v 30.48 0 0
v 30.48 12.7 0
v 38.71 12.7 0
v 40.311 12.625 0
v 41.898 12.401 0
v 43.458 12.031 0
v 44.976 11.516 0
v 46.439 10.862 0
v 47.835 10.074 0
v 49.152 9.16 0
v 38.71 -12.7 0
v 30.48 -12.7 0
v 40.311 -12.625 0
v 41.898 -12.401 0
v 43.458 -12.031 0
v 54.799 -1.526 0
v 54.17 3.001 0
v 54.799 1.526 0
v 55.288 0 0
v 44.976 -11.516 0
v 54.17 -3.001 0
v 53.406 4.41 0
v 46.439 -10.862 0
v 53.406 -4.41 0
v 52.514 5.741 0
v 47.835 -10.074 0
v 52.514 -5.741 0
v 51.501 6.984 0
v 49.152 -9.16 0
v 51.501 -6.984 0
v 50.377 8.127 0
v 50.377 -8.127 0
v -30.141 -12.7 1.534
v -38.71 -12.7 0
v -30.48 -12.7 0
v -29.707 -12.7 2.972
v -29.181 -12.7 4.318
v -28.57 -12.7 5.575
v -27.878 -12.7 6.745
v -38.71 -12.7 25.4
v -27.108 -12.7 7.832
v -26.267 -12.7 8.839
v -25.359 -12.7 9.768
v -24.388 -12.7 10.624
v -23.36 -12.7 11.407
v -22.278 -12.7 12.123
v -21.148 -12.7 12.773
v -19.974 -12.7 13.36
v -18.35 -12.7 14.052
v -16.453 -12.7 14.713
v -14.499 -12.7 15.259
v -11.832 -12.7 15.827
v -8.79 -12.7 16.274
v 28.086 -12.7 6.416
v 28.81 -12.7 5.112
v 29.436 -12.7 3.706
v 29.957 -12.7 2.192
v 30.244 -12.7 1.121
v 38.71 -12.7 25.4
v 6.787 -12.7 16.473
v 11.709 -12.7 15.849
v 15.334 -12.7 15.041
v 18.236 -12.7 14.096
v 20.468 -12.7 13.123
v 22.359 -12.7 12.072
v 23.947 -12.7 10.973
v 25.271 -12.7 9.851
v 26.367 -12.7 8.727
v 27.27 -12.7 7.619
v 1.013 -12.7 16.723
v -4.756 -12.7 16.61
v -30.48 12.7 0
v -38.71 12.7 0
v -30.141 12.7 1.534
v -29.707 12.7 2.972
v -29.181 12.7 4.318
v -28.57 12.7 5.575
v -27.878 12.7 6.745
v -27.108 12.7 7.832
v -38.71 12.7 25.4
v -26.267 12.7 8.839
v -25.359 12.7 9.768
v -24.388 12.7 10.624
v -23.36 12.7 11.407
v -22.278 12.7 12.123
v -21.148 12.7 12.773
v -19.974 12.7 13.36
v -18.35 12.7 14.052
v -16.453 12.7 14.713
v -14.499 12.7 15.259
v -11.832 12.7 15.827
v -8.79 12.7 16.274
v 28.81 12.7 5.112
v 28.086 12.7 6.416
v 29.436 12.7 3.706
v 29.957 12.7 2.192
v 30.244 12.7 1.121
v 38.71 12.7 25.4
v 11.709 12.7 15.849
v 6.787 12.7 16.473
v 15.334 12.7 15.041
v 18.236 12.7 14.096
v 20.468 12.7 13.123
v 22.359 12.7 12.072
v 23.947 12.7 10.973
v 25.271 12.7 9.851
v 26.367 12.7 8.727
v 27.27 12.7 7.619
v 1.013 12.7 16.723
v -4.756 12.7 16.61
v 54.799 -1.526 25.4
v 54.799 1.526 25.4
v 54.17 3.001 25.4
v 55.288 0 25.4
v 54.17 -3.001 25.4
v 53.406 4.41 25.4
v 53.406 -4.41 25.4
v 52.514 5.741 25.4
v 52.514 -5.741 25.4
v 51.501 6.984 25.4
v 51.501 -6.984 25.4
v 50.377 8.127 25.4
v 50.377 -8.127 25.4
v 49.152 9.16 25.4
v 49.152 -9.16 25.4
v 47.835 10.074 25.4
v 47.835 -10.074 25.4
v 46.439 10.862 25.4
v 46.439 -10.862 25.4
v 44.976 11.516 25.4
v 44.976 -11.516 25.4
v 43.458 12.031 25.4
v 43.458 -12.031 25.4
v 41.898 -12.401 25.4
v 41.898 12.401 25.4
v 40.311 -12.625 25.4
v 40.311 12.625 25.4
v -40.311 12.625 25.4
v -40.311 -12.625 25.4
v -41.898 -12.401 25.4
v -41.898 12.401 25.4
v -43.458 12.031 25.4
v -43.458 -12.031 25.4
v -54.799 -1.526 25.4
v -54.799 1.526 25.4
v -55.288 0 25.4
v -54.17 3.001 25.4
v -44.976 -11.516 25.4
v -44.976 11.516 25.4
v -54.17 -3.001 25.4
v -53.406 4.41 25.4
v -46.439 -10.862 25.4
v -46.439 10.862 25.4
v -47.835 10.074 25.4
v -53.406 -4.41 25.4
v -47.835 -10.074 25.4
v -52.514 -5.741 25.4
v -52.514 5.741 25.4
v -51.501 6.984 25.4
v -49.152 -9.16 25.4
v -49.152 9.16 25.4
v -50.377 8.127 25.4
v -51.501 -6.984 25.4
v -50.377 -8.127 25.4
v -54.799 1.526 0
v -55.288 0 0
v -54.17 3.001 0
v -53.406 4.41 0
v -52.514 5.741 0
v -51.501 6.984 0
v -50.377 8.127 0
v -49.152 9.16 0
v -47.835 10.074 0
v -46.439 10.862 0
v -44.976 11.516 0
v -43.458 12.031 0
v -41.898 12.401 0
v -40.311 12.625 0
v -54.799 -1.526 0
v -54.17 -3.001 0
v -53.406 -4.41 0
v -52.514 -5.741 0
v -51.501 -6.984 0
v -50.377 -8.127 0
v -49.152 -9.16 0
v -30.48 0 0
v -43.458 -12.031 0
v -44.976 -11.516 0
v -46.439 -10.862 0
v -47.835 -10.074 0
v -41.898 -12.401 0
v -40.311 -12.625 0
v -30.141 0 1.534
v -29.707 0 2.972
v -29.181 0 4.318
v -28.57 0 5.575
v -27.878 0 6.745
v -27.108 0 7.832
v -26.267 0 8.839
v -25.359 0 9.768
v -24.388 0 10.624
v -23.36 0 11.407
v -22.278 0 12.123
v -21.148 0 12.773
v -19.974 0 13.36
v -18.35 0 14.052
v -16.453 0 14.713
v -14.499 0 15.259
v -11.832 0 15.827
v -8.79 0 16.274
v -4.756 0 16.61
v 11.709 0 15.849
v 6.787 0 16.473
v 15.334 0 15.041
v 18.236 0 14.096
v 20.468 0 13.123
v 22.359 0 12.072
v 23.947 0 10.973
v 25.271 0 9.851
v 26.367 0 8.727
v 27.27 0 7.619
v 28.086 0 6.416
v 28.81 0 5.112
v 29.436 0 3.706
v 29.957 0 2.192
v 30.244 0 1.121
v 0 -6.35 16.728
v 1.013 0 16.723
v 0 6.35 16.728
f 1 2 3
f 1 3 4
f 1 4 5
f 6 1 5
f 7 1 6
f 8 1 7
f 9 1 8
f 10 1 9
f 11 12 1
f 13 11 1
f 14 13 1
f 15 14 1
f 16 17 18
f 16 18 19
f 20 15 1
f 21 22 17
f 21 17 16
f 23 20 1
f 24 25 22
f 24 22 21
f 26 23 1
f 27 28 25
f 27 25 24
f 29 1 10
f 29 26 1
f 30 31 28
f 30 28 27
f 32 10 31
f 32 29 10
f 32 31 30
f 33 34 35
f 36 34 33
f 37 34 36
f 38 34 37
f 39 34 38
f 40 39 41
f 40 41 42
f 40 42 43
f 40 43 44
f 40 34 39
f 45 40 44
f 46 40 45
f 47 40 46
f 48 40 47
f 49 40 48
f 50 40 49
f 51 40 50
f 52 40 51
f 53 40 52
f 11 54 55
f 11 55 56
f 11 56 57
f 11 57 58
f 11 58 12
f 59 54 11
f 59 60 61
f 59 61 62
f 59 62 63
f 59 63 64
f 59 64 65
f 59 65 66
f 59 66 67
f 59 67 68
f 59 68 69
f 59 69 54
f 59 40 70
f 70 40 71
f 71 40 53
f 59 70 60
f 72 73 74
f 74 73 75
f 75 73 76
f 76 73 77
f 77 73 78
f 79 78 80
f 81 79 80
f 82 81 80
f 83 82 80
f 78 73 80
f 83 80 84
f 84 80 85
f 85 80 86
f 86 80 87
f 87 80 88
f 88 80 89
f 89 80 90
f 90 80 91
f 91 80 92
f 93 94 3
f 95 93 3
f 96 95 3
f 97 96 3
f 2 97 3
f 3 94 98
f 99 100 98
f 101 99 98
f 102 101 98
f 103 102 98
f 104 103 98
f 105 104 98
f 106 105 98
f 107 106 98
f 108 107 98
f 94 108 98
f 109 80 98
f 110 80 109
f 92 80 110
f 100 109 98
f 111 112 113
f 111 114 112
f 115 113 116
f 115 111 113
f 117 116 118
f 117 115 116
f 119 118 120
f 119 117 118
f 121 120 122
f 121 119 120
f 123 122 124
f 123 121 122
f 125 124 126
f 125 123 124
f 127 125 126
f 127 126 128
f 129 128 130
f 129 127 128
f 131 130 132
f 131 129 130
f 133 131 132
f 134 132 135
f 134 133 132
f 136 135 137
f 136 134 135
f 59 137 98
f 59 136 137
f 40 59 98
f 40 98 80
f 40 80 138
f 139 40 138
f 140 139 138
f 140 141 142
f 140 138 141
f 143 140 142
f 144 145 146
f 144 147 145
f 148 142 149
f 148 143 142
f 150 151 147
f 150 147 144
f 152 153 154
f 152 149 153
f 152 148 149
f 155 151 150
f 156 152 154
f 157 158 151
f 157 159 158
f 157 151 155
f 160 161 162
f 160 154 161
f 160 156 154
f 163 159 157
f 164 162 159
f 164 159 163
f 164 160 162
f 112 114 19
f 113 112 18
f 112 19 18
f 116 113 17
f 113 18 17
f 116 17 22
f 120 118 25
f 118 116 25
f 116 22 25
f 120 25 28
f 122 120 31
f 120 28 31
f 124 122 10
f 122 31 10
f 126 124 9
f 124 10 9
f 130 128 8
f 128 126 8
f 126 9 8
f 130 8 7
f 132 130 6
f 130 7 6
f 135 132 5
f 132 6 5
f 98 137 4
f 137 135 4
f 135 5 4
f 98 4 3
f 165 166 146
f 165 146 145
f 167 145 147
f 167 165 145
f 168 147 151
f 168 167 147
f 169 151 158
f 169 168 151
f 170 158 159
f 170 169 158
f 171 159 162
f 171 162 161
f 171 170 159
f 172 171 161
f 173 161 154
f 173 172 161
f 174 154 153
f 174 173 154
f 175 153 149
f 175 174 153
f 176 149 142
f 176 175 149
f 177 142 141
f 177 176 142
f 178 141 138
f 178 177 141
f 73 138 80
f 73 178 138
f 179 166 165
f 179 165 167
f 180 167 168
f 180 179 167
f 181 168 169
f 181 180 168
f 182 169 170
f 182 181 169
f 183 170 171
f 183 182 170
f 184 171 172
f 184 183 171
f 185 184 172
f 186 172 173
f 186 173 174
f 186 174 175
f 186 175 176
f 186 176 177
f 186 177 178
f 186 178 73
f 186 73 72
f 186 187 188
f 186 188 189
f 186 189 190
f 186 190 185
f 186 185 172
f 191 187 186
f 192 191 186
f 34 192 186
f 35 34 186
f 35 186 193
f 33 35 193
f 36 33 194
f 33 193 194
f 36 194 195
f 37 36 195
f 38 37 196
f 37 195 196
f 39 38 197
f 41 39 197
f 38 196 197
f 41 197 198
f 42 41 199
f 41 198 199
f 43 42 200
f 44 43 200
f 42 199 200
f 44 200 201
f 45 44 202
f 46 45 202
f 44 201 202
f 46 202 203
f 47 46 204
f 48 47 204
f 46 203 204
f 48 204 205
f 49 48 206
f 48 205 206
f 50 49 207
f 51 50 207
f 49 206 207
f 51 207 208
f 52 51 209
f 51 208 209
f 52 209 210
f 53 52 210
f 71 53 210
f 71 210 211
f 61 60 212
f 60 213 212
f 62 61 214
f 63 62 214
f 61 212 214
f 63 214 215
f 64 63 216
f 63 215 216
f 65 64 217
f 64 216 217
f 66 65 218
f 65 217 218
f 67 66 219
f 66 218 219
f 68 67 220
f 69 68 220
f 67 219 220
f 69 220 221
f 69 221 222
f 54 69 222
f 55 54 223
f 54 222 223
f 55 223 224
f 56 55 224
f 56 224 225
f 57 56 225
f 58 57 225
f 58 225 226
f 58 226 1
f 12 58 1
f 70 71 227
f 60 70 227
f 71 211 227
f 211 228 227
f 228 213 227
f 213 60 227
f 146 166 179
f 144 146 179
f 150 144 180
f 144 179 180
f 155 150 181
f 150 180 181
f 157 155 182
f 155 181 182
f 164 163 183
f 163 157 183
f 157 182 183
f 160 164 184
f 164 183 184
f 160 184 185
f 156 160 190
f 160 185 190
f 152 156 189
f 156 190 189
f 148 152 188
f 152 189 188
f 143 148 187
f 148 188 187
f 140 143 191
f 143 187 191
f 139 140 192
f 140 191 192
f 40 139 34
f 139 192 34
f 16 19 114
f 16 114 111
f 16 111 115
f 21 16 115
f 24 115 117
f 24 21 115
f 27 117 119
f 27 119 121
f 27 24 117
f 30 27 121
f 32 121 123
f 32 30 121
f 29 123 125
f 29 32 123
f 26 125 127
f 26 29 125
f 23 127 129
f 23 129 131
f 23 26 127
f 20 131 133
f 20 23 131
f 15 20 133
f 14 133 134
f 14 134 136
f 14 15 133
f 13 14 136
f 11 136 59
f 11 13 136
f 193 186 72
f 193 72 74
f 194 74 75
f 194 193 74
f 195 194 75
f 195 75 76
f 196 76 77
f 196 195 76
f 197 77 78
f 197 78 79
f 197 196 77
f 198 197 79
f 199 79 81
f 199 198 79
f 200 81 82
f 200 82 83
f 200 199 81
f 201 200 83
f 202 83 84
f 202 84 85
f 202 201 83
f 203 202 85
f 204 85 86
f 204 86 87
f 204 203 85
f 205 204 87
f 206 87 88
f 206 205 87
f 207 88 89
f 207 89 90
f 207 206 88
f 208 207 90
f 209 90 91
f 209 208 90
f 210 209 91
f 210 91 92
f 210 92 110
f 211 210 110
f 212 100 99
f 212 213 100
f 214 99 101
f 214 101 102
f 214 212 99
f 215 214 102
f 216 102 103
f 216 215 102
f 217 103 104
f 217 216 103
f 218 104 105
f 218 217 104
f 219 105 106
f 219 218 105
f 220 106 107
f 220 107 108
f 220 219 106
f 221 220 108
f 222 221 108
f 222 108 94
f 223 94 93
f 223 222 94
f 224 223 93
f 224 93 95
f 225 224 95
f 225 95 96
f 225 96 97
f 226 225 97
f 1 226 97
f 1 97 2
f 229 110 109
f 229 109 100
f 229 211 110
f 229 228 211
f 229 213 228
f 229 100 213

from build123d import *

# Parameters (mm, degrees)
F1_DEPTH    = 12.7
F2_T1_DEPTH = 111.249434278


# Not quite as in the source:
# - a fillet or chamfer that OpenCascade refuses, or shapes differently, is made with other operations: its cross-section is extruded or revolved along the edge and cut away or added


with BuildPart() as f1:
    # F0 (on Front) → F1 (new body, symmetric)
    with BuildSketch(Plane.XZ):
        with BuildLine():
            Line((-55.88, 0), (-30.48, 0))
            add(Edge.make_bspline(
                [(-30.48, 0), (-27.7506317943, 14.9127226323), (-11.670826003, 16.7281851172), (0, 16.7281851172)],
                knots=[0, 0, 0, 0, 34.7687011163, 34.7687011163, 34.7687011163, 34.7687011163], degree=3))
            add(Edge.make_bspline(
                [(30.48, 0), (27.7506317943, 14.9127226323), (11.670826003, 16.7281851172), (0, 16.7281851172)],
                knots=[0, 0, 0, 0, 34.7687011163, 34.7687011163, 34.7687011163, 34.7687011163], degree=3))
            Line((30.48, 0), (55.88, 0))
            Line((55.88, 0), (55.88, 25.4))
            Line((55.88, 25.4), (-55.88, 25.4))
            Line((-55.88, 25.4), (-55.88, 0))
        make_face()
    extrude(amount=F1_DEPTH, both=True)

    # F2: fillet of radius 17.1698868556 on 4 edges, made by hand

    # F2_s2 → F2_t1 (cut)
    with BuildSketch(Plane.XY.offset(-42.924717139)):
        with BuildLine():
            ThreePointArc((55.88, 4.4698868556), (50.8510565722, -7.6710565722), (38.7101131444, -12.7))
            Line((38.7101131444, -12.7), (55.88, -12.7))
            Line((55.88, -12.7), (55.88, 4.4698868556))
        make_face()
        with BuildLine():
            ThreePointArc((55.88, -4.4698868556), (50.8510565722, 7.6710565722), (38.7101131444, 12.7))
            Line((38.7101131444, 12.7), (55.88, 12.7))
            Line((55.88, 12.7), (55.88, -4.4698868556))
        make_face()
        with BuildLine():
            ThreePointArc((-55.88, 4.4698868556), (-50.8510565722, -7.6710565722), (-38.7101131444, -12.7))
            Line((-38.7101131444, -12.7), (-55.88, -12.7))
            Line((-55.88, -12.7), (-55.88, 4.4698868556))
        make_face()
        with BuildLine():
            ThreePointArc((-55.88, -4.4698868556), (-50.8510565722, 7.6710565722), (-38.7101131444, 12.7))
            Line((-38.7101131444, 12.7), (-55.88, 12.7))
            Line((-55.88, 12.7), (-55.88, -4.4698868556))
        make_face()
    extrude(amount=F2_T1_DEPTH, mode=Mode.SUBTRACT)


solid = f1.part
